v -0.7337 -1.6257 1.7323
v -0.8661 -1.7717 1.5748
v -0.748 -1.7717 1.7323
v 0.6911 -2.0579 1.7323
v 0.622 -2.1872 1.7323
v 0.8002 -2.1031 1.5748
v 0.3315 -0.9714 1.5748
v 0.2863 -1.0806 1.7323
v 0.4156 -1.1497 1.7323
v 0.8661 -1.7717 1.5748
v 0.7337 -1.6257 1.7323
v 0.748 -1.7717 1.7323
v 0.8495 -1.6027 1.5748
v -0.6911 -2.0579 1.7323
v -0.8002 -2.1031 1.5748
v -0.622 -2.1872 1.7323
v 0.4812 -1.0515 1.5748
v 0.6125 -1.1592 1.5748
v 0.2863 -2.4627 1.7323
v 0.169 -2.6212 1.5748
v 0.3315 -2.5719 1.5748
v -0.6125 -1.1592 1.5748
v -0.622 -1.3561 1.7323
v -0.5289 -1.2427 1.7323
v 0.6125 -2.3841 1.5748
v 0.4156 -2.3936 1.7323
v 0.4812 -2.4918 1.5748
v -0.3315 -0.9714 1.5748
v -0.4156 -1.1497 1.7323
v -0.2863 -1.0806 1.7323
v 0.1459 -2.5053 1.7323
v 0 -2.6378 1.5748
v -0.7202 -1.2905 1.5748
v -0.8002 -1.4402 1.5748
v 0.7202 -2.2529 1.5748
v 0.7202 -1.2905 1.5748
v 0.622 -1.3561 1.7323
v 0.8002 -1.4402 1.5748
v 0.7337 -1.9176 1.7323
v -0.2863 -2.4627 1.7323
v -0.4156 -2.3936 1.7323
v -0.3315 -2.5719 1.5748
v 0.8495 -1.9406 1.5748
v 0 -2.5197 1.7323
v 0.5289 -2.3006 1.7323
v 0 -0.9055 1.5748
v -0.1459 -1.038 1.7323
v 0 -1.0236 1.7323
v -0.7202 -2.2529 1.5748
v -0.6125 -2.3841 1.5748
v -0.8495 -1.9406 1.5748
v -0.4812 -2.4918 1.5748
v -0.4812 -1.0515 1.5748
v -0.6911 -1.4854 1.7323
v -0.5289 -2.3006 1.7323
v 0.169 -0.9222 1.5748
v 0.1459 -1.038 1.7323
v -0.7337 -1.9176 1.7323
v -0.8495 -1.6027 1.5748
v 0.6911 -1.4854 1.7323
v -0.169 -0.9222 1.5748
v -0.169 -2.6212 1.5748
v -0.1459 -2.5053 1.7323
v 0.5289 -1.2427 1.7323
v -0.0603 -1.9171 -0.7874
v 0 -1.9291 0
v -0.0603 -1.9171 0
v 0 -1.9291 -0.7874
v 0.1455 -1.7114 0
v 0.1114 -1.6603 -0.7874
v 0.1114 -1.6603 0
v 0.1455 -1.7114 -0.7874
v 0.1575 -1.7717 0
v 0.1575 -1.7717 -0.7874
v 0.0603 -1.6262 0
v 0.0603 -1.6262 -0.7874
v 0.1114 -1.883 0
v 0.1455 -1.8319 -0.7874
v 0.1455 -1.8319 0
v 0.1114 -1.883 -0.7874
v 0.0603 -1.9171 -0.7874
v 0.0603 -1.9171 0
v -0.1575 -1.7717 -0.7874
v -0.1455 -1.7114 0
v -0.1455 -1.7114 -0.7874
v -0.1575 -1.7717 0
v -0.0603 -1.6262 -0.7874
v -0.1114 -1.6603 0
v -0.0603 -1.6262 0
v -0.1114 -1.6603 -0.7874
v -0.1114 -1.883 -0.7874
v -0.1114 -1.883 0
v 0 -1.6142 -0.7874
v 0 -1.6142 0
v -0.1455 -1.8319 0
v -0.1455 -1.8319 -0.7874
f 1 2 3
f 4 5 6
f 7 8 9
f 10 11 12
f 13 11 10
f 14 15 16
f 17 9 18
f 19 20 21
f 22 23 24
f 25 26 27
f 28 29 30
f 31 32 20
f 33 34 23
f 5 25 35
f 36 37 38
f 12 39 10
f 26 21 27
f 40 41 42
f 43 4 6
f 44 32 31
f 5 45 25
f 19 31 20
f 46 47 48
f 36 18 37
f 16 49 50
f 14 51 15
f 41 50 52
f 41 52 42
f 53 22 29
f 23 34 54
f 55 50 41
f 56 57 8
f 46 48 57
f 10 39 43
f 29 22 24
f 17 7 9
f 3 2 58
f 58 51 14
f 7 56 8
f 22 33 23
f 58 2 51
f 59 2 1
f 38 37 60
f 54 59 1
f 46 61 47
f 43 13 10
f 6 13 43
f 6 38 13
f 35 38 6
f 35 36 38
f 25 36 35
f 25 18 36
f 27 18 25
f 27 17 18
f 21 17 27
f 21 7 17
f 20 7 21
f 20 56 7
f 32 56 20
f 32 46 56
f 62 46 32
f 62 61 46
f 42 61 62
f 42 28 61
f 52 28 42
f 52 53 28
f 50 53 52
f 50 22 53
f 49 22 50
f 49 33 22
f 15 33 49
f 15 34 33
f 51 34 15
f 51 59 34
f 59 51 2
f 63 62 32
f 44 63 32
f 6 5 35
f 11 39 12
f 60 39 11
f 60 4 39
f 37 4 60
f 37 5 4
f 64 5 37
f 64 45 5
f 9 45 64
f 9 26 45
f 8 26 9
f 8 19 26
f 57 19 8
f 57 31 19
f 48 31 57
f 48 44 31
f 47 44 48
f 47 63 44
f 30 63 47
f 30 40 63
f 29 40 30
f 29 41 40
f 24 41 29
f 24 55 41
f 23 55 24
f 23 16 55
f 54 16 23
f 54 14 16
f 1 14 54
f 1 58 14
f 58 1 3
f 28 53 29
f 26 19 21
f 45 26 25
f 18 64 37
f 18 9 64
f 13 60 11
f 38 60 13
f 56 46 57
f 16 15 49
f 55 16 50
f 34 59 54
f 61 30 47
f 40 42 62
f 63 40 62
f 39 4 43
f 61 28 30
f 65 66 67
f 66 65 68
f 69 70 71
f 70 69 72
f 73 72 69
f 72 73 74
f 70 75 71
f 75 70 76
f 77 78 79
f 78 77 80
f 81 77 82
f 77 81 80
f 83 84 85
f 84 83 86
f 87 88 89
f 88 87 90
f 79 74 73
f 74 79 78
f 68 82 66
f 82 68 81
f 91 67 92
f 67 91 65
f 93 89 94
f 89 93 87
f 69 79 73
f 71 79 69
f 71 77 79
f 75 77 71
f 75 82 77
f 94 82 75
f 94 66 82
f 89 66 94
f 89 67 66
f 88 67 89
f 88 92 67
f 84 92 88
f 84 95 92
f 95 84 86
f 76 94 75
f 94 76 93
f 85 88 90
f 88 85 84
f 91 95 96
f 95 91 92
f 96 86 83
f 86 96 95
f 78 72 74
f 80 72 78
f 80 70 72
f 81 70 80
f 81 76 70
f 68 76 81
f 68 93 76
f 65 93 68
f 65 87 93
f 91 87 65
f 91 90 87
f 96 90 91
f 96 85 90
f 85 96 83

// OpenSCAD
// file: defines.scad
L = 35.0;
W = 35.0;
H = 4.0;

/* Смещение вывода */
pin_d = 0.8;
pin_h = 2.0;
pin_ox = 0.0;
pin_oy = 4.5;

c_d = 4;  // Диаметр скругления

$fn = 32;

scale = 1/2.54;
// main file
include <defines.scad>

top_h = 0.4;  // Возвышение над корпусом

scale(scale) color([0.9,0.9,0.9]) {
  translate([pin_ox, -pin_oy, H]) cylinder(r1=2.2, r2=1.9, h=top_h, center=false);
  translate([pin_ox, -pin_oy, -pin_h]) cylinder(r=pin_d/2, h=pin_h, center=false, $fn=16);
}
